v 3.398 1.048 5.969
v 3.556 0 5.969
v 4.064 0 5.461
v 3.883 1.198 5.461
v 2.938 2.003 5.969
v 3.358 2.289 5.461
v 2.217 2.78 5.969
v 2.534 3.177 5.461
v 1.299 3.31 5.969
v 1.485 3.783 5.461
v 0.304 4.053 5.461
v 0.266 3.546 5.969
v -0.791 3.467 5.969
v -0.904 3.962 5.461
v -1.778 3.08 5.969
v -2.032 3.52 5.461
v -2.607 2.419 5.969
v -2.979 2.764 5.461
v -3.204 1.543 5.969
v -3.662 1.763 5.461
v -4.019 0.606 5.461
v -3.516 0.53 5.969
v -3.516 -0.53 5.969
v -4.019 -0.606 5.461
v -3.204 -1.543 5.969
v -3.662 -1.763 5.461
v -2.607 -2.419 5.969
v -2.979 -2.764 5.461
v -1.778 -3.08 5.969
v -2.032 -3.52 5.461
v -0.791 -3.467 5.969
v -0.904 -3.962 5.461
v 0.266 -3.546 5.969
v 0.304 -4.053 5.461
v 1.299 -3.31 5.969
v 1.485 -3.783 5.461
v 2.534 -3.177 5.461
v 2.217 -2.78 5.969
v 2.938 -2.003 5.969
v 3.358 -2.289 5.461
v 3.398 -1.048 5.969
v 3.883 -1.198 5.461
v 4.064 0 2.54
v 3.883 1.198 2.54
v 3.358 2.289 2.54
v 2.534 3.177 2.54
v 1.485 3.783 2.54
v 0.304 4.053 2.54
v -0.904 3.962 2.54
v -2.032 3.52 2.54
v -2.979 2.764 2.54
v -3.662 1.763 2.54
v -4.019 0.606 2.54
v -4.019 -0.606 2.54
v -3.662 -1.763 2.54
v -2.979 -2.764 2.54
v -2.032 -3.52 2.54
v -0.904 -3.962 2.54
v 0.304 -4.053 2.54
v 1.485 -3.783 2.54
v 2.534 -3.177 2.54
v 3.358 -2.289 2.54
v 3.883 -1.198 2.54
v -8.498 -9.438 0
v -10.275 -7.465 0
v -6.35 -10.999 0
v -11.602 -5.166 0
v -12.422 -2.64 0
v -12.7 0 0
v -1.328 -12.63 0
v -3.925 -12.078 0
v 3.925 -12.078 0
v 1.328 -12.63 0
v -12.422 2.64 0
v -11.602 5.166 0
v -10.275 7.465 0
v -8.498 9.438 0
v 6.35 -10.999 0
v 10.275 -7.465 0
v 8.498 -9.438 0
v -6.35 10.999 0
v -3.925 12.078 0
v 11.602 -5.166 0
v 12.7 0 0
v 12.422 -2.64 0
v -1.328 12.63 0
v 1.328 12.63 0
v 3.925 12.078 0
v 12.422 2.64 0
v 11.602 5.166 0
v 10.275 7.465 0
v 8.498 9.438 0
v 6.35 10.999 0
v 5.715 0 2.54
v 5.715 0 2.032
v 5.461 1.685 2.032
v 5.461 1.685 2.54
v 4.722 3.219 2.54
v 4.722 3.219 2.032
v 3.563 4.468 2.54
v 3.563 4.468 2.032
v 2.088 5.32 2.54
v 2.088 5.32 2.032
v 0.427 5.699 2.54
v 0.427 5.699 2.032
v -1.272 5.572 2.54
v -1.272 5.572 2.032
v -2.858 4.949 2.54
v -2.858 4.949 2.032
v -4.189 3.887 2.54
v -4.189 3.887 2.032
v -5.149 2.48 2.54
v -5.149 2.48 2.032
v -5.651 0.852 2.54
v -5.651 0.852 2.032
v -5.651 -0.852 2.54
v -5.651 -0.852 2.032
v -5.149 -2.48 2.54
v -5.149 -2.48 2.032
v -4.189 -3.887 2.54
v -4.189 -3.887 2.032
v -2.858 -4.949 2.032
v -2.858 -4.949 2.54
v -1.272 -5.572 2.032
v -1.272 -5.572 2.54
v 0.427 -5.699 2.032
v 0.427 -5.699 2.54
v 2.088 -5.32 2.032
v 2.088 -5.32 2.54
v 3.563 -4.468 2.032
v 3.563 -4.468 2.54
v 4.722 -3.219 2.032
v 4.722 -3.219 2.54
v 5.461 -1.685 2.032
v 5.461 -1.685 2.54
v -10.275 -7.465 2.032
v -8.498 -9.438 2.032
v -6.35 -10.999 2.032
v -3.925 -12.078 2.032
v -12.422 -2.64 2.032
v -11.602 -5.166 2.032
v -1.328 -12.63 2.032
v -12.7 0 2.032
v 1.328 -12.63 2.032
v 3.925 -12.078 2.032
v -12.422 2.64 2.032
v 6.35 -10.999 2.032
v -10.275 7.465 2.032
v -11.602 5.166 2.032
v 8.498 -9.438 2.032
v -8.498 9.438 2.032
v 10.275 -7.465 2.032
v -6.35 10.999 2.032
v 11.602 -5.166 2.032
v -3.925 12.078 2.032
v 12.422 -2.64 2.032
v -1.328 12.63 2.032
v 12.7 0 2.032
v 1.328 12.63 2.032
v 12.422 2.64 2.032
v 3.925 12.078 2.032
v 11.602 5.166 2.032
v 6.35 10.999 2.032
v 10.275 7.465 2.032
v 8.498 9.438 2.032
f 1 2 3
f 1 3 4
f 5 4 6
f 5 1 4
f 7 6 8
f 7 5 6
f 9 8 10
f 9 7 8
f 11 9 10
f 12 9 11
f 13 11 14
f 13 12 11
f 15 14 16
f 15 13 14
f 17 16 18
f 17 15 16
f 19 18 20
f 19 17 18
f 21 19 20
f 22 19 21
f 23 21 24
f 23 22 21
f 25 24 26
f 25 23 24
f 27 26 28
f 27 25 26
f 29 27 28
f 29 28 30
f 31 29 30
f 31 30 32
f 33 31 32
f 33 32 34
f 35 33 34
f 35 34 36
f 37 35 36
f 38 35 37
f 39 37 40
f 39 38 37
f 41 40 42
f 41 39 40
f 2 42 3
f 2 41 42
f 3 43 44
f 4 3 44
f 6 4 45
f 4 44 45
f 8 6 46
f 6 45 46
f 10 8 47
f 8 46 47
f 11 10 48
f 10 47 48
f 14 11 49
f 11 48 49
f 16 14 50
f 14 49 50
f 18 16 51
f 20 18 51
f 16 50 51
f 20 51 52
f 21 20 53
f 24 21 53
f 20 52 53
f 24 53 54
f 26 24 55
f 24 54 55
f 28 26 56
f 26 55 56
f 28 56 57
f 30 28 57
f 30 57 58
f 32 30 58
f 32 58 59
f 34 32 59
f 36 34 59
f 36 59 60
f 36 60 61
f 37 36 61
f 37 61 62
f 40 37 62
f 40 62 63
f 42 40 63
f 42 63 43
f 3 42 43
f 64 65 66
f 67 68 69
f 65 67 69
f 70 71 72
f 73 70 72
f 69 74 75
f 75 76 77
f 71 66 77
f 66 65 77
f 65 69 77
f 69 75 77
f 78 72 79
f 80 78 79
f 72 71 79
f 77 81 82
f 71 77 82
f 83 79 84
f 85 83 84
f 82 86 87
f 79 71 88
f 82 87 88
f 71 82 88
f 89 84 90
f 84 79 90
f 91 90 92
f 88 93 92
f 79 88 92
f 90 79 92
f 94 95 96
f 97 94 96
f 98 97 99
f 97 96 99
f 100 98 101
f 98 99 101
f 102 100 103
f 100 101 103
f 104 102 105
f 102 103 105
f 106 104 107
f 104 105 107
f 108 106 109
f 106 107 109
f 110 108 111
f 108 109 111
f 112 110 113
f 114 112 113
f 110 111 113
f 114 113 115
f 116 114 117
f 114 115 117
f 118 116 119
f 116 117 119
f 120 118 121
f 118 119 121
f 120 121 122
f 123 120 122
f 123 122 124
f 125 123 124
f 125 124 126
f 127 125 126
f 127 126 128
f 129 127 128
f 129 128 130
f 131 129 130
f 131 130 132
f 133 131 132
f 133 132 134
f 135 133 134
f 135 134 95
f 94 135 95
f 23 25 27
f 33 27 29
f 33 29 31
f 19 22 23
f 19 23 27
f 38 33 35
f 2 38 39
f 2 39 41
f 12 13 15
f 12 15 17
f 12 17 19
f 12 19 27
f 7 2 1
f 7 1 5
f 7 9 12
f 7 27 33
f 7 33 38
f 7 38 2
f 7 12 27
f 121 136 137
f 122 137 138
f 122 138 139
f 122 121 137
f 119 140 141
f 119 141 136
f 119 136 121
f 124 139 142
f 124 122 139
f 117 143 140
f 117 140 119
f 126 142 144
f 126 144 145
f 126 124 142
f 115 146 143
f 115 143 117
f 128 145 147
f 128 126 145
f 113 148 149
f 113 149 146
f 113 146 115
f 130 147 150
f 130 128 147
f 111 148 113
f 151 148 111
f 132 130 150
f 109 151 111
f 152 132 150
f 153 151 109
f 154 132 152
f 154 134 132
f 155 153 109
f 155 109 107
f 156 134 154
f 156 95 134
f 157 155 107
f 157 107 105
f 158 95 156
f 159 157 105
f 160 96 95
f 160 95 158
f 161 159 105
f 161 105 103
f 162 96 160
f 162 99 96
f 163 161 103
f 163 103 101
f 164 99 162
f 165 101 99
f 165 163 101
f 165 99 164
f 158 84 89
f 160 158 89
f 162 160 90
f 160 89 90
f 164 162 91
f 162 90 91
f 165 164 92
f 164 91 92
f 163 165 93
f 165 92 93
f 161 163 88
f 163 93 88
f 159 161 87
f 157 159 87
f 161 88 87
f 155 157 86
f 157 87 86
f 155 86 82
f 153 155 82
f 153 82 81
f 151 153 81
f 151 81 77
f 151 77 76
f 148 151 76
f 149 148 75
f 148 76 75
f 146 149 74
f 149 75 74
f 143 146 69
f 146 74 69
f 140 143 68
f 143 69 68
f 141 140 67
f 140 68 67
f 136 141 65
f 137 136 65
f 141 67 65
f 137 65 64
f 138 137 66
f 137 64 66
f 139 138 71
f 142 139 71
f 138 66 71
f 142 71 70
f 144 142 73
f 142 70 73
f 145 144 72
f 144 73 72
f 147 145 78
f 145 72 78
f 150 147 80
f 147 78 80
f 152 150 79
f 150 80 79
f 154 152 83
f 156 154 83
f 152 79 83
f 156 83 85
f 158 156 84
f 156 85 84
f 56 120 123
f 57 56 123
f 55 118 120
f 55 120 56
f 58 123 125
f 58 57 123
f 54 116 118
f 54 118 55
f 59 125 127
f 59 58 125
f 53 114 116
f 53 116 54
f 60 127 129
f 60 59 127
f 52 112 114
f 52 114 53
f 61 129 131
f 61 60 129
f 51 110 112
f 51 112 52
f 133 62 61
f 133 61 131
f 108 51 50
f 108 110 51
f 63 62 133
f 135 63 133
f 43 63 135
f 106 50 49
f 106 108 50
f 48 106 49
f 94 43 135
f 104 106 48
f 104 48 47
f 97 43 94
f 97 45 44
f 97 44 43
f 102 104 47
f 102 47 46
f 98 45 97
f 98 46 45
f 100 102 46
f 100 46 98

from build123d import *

# Parameters (mm, degrees)
F0_R     = 12.7
F1_DEPTH = 2.032
F2_R     = 4.064
F3_DEPTH = 5.969
F4_SIZE  = 0.508
F5_R     = 5.715
F6_DEPTH = 2.54


with BuildPart() as f1:
    # F0 (on Top) → F1 (new body)
    with BuildSketch(Plane.XY):
        Circle(F0_R)
    extrude(amount=F1_DEPTH)

    # F2 (on Top) → F3 (join)
    with BuildSketch(Plane.XY):
        Circle(F2_R)
    extrude(amount=F3_DEPTH)

    # F4
    f4_edges = [f1.edges().sort_by_distance(p)[0] for p in [
        (-4.064, 0, 5.969),
    ]]
    chamfer(f4_edges, length=F4_SIZE)

    # F5 (on Top) → F6 (join)
    with BuildSketch(Plane.XY):
        Circle(F5_R)
    extrude(amount=F6_DEPTH)


solid = f1.part
